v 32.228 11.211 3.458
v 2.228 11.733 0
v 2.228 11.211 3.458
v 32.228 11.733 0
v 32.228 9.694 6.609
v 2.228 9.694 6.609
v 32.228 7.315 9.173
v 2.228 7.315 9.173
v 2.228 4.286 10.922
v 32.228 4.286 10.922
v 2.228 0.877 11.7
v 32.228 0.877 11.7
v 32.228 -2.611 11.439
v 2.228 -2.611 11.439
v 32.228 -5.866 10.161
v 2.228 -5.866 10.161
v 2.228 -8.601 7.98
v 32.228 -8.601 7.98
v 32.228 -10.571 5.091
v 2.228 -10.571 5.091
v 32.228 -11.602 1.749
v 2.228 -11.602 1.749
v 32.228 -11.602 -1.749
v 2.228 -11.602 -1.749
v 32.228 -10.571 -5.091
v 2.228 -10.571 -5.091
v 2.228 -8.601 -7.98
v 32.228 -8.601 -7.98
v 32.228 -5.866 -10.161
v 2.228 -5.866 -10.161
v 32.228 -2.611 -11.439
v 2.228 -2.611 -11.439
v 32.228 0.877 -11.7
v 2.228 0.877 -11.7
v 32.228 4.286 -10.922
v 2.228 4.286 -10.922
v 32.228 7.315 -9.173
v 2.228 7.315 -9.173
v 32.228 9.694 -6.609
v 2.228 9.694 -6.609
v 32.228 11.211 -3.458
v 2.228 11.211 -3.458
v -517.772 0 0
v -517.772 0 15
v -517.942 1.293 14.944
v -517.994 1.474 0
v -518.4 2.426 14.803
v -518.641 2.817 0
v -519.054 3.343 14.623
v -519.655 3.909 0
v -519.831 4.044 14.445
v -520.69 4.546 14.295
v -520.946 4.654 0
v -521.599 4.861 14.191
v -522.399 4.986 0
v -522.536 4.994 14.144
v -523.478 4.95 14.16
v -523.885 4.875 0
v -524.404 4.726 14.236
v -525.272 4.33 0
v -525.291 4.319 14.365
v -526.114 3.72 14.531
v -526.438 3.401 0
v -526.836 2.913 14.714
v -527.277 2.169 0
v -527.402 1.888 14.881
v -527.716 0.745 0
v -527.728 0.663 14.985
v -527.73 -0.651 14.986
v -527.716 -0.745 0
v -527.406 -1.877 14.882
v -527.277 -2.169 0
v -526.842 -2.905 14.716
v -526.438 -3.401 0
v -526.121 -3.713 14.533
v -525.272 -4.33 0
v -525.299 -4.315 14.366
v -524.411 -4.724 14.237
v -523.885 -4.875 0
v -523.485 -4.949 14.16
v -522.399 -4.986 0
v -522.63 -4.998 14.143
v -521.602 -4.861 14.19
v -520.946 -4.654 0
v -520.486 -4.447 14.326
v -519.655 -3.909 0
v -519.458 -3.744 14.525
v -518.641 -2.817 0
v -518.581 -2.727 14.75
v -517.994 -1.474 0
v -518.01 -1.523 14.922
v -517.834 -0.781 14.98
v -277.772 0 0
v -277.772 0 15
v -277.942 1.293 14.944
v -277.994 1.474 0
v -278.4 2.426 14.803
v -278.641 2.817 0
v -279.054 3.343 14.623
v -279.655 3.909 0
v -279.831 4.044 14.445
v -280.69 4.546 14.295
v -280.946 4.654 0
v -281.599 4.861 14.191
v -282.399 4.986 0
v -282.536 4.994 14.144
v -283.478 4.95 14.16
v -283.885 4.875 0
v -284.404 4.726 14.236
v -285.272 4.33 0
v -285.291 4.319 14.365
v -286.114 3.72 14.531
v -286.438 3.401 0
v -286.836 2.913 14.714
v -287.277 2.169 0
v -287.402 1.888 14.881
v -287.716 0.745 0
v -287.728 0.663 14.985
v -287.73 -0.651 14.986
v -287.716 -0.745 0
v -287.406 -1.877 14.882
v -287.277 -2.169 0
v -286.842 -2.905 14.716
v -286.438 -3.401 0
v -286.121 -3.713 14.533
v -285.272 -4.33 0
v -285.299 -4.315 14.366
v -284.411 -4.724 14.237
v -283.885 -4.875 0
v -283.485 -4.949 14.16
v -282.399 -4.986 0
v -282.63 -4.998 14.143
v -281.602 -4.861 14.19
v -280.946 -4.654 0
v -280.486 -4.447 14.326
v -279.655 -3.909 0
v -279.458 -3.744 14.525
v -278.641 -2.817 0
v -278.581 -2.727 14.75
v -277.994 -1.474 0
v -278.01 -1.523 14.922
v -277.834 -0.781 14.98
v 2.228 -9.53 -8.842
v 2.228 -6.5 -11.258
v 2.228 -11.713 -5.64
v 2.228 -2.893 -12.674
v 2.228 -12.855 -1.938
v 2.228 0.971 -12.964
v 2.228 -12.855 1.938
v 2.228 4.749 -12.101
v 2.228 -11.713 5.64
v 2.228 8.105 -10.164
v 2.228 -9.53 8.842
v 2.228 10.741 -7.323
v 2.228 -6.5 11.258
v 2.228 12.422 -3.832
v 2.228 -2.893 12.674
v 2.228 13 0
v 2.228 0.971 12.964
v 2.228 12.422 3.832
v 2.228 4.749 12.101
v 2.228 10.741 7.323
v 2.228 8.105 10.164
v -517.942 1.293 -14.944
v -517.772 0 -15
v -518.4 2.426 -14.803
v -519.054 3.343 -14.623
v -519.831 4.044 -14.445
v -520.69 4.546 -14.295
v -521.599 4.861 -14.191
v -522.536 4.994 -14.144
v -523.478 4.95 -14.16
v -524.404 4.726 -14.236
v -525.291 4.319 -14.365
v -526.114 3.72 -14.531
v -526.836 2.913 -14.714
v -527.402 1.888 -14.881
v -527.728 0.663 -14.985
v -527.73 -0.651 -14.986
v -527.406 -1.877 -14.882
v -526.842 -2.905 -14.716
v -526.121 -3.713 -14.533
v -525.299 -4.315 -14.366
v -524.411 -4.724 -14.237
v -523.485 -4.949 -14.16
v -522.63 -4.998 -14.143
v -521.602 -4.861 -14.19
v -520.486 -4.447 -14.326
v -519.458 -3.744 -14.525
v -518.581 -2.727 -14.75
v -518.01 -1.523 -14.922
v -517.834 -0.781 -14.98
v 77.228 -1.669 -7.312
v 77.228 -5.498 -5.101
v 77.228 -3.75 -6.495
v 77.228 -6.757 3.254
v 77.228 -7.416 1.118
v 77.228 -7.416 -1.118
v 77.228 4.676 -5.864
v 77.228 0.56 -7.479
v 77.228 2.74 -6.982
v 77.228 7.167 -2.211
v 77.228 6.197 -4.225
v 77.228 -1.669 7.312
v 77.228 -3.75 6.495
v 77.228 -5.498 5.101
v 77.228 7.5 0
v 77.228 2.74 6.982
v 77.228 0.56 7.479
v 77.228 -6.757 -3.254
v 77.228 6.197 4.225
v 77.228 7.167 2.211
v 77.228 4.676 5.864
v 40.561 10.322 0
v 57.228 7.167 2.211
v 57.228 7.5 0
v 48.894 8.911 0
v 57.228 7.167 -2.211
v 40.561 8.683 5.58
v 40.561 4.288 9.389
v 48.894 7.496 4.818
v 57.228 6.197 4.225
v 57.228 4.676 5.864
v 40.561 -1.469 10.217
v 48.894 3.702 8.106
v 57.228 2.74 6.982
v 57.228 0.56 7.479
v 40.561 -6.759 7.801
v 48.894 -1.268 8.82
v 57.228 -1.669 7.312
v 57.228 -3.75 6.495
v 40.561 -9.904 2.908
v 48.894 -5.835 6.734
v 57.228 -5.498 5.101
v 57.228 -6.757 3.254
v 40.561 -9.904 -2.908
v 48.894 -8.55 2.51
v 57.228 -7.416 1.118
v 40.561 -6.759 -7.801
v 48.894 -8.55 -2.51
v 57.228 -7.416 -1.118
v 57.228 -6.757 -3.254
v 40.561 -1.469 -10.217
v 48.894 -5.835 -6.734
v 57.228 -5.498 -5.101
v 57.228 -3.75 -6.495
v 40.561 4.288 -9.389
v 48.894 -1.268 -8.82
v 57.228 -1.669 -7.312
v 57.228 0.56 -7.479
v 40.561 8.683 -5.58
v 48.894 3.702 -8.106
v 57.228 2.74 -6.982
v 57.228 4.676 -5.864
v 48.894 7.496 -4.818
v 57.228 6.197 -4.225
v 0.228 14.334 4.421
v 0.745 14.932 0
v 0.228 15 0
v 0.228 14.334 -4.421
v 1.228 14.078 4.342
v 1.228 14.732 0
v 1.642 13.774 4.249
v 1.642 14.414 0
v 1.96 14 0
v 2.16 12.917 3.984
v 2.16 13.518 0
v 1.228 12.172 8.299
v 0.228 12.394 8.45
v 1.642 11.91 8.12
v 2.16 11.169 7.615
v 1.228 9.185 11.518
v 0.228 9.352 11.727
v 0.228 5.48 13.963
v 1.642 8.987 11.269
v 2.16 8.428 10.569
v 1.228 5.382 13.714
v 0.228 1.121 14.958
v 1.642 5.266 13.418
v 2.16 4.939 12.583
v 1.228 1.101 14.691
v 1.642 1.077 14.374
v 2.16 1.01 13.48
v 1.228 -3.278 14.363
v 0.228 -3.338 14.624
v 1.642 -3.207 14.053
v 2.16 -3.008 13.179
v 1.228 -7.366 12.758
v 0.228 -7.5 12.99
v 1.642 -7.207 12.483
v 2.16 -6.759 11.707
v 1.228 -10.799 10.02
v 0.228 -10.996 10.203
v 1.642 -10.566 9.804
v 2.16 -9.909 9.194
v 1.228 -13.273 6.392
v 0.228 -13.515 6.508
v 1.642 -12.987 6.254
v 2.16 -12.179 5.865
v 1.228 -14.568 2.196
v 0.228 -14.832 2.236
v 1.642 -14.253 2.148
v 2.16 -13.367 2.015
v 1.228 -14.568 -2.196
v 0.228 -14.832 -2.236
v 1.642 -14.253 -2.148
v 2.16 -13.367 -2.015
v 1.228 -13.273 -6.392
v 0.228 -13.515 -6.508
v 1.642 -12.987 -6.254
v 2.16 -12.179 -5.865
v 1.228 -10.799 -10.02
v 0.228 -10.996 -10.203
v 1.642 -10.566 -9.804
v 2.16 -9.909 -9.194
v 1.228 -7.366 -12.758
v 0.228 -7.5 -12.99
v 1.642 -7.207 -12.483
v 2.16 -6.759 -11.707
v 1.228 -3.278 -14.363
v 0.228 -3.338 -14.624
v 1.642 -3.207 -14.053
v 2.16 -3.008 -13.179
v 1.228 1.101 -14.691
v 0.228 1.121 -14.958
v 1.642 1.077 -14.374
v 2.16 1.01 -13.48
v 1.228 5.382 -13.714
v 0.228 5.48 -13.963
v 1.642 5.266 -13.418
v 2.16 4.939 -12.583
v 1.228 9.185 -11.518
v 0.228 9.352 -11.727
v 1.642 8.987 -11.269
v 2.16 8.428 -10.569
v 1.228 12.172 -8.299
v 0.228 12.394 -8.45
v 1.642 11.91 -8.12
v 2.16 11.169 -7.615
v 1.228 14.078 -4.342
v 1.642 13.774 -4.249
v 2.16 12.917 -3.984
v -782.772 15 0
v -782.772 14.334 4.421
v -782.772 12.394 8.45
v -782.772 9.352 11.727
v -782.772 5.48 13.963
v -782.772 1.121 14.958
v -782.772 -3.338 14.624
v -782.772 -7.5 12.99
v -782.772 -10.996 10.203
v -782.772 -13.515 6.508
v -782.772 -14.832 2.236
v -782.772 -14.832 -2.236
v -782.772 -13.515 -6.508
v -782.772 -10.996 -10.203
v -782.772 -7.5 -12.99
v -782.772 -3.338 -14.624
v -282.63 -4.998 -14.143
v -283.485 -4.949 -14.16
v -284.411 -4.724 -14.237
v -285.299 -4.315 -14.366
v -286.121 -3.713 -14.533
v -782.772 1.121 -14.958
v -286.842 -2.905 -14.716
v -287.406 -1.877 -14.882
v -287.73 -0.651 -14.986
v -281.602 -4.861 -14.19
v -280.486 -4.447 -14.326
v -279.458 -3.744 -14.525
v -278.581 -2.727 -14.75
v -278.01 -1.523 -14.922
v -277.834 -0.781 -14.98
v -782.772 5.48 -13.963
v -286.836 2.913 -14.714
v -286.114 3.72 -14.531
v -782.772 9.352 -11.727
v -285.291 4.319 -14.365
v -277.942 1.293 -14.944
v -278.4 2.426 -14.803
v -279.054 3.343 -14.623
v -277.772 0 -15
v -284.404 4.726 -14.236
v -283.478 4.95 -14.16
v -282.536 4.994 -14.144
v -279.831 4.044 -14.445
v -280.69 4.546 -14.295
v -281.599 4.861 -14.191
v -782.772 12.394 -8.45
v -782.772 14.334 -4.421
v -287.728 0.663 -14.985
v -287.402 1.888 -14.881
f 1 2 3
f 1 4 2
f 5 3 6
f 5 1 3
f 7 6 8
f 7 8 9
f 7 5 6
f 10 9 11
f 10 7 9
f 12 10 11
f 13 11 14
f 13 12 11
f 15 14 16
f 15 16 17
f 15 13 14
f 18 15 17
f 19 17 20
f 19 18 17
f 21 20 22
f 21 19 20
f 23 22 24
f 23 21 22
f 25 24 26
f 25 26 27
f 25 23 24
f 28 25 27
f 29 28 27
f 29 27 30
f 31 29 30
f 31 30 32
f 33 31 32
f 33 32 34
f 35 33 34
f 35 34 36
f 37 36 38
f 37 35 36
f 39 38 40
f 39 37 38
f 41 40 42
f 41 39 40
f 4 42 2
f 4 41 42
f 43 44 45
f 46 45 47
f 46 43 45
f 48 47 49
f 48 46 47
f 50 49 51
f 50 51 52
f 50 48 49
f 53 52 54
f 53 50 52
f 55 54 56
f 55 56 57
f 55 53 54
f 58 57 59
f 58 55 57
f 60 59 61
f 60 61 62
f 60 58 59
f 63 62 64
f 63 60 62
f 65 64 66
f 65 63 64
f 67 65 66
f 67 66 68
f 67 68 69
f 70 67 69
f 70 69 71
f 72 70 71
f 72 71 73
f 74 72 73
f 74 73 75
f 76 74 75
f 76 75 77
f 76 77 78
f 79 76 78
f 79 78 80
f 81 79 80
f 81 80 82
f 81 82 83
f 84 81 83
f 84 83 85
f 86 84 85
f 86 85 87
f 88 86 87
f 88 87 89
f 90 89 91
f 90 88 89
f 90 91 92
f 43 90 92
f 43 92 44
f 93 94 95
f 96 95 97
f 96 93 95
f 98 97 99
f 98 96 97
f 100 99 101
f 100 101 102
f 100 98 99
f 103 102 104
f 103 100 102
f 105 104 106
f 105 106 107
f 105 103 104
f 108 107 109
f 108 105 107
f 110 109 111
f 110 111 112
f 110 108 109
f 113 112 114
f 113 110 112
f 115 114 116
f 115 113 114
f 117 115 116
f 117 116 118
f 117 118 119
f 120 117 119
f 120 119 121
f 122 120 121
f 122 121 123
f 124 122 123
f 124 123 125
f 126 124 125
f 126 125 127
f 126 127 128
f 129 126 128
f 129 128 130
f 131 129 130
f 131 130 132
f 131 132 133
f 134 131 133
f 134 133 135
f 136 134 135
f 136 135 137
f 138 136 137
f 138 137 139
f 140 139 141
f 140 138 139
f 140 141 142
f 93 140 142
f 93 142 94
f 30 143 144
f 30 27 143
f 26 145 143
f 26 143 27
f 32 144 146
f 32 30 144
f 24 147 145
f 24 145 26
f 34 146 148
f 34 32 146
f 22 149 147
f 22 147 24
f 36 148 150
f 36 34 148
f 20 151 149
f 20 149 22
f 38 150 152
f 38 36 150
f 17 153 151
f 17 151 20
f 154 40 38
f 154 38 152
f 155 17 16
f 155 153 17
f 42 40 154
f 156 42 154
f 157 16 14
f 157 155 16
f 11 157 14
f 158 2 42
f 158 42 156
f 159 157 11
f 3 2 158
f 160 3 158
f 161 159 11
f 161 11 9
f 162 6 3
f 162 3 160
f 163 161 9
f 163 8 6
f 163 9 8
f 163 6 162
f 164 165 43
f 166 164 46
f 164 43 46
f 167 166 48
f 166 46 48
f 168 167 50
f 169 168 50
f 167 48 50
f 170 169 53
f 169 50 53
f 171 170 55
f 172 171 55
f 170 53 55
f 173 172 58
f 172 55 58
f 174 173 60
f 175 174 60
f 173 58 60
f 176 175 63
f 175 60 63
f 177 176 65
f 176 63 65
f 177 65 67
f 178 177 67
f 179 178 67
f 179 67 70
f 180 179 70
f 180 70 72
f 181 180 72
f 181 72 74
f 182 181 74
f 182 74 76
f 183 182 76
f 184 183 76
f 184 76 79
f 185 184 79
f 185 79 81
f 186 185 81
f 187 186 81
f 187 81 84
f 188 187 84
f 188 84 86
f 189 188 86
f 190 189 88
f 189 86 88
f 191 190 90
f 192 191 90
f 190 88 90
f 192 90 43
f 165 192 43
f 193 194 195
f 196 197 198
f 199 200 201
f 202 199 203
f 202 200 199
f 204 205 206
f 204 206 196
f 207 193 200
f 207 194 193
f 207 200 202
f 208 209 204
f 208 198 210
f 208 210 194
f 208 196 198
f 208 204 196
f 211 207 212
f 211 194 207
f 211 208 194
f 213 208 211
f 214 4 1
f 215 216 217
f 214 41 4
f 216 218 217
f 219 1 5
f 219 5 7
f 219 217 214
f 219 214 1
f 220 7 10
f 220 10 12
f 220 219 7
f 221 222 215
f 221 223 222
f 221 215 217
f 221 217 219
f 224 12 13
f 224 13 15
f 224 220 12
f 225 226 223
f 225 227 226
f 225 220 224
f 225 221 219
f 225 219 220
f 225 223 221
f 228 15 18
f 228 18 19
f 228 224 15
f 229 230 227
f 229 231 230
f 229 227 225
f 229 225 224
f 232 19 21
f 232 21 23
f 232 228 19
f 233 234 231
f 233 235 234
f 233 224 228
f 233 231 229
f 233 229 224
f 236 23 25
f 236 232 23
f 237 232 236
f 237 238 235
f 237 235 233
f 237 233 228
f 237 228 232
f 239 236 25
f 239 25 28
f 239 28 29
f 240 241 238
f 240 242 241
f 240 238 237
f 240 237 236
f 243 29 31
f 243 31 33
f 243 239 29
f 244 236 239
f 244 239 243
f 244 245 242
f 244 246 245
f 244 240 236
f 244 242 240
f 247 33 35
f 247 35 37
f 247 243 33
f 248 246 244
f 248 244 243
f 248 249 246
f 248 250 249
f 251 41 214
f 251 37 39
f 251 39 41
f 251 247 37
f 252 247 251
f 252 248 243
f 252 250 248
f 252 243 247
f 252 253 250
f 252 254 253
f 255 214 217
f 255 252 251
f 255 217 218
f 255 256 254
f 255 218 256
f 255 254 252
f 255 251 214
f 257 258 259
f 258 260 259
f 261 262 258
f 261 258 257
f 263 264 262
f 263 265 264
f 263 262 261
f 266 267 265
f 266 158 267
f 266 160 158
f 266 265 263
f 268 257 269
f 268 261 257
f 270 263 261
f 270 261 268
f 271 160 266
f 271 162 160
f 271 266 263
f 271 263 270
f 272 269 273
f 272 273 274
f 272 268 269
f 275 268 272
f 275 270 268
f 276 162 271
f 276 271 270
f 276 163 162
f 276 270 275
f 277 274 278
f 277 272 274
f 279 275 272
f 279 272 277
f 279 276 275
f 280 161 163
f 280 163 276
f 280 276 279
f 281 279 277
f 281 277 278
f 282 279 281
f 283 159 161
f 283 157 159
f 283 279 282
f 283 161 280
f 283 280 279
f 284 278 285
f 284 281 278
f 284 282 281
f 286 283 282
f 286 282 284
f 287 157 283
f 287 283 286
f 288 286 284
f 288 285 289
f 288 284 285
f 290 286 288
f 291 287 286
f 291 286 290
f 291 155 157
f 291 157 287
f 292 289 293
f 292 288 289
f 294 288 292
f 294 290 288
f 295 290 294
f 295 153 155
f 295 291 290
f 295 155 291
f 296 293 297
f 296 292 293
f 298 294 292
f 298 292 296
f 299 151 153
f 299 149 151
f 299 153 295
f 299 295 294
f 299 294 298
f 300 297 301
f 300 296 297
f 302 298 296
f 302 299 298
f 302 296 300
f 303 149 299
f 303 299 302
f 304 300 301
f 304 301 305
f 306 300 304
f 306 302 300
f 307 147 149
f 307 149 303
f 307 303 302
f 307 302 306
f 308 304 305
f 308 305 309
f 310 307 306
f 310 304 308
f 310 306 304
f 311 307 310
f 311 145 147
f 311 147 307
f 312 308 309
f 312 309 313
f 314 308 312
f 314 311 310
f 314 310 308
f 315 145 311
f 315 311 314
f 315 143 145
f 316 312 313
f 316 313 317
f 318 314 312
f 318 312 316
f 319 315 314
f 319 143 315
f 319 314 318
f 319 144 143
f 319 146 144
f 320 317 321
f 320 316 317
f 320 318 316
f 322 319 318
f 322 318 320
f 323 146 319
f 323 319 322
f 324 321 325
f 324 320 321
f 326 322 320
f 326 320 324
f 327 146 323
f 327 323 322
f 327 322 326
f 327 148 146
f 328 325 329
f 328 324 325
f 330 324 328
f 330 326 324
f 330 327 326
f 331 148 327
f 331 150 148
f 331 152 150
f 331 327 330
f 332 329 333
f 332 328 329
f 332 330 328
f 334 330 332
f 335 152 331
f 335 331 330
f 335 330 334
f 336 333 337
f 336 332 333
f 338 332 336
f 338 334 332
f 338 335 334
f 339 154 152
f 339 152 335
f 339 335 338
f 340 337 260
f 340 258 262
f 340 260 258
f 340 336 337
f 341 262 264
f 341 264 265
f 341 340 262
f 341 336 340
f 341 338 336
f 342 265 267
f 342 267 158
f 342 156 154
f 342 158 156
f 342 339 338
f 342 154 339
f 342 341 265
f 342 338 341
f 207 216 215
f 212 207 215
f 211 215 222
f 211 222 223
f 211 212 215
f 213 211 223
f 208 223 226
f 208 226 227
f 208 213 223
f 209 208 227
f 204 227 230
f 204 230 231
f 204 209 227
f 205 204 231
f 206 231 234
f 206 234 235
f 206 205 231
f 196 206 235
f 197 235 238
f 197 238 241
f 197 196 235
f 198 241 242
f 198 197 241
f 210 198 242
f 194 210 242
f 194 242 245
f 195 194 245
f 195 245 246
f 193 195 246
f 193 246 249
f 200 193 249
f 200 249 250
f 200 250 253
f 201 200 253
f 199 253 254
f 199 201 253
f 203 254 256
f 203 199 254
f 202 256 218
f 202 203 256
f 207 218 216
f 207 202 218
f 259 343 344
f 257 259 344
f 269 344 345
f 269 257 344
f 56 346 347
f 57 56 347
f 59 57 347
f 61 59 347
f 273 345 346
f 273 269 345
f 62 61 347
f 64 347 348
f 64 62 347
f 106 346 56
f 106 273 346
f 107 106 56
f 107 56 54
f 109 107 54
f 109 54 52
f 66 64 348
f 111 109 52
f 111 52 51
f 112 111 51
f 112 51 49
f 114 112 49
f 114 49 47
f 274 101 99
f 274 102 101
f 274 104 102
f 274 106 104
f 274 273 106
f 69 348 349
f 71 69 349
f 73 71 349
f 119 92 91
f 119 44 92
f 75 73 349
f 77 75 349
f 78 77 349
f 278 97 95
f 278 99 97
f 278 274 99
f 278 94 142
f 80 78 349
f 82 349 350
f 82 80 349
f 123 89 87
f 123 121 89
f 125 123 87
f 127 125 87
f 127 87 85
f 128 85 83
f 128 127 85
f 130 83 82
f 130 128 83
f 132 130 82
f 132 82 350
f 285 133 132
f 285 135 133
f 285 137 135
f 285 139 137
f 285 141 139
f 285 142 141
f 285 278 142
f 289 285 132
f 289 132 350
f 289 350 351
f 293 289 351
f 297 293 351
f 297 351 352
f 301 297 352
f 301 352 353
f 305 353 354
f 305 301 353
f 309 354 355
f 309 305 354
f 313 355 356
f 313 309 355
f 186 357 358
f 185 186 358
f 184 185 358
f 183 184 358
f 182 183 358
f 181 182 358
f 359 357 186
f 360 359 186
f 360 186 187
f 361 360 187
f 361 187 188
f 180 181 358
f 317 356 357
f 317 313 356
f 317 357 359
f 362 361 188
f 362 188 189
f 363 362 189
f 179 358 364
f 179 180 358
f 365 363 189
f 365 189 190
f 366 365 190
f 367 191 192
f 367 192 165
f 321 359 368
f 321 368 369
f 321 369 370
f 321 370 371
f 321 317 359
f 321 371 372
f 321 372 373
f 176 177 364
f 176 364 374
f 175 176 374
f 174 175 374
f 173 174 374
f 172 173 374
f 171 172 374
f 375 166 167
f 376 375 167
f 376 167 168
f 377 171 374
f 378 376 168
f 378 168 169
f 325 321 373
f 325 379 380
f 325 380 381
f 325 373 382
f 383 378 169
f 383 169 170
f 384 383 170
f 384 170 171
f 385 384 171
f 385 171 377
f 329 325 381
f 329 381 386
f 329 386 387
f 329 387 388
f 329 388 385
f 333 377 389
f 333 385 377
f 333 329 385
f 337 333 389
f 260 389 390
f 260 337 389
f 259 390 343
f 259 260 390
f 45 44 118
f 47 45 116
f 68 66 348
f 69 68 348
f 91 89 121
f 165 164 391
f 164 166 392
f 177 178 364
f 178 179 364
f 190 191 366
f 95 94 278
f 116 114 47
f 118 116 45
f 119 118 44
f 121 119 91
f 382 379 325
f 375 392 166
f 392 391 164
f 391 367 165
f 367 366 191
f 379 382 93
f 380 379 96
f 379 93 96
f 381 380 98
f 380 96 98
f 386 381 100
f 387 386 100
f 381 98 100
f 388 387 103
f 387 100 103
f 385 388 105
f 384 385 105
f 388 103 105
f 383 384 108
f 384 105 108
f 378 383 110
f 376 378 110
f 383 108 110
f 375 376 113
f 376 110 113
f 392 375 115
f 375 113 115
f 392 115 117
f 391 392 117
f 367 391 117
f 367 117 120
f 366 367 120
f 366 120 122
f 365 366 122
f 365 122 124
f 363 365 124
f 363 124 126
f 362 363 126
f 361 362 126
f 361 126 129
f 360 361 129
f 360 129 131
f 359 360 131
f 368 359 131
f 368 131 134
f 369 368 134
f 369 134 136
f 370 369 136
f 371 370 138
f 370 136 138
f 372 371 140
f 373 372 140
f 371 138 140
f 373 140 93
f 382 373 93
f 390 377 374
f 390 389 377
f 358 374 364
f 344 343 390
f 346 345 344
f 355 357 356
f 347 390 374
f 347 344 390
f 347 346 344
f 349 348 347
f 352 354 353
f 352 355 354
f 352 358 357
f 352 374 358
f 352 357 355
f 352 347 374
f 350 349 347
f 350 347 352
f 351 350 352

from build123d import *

# Parameters (mm, degrees)
FILLET1_R               = 2
SKETCH2_R               = 5
CUT_EXTRUDE1_DEPTH      = 16
CUT_EXTRUDE1_DEPTH_BACK = 16


with BuildPart() as part:
    # Sketch1 → Revolve1 (revolve)
    with BuildSketch(Plane.XY):
        Polygon((-782.772277228, 0), (-782.772277228, 15), (2.227722772, 15), (2.227722772, 11.732673267), (32.227722772, 11.732673267), (57.227722772, 7.5), (77.227722772, 7.5), (77.227722772, 0), align=None)
    revolve(axis=Axis((-782.772277228, 0, 0), (1, 0, 0)))

    # Fillet1
    fillet1_edges = [part.edges().sort_by_distance(p)[0] for p in [
        (2.227722772, -15, 0),
    ]]
    fillet(fillet1_edges, radius=FILLET1_R)

    # Sketch2 → Cut-Extrude1 (cut, two sides)
    with BuildSketch(Plane.XY) as cut_extrude1_sk:
        with Locations((-522.772277228, 0)):
            Circle(SKETCH2_R)
        with Locations((-282.772277228, 0)):
            Circle(SKETCH2_R)
    extrude(amount=CUT_EXTRUDE1_DEPTH, mode=Mode.SUBTRACT)
    extrude(cut_extrude1_sk.sketch, amount=-CUT_EXTRUDE1_DEPTH_BACK, mode=Mode.SUBTRACT)


solid = part.part
